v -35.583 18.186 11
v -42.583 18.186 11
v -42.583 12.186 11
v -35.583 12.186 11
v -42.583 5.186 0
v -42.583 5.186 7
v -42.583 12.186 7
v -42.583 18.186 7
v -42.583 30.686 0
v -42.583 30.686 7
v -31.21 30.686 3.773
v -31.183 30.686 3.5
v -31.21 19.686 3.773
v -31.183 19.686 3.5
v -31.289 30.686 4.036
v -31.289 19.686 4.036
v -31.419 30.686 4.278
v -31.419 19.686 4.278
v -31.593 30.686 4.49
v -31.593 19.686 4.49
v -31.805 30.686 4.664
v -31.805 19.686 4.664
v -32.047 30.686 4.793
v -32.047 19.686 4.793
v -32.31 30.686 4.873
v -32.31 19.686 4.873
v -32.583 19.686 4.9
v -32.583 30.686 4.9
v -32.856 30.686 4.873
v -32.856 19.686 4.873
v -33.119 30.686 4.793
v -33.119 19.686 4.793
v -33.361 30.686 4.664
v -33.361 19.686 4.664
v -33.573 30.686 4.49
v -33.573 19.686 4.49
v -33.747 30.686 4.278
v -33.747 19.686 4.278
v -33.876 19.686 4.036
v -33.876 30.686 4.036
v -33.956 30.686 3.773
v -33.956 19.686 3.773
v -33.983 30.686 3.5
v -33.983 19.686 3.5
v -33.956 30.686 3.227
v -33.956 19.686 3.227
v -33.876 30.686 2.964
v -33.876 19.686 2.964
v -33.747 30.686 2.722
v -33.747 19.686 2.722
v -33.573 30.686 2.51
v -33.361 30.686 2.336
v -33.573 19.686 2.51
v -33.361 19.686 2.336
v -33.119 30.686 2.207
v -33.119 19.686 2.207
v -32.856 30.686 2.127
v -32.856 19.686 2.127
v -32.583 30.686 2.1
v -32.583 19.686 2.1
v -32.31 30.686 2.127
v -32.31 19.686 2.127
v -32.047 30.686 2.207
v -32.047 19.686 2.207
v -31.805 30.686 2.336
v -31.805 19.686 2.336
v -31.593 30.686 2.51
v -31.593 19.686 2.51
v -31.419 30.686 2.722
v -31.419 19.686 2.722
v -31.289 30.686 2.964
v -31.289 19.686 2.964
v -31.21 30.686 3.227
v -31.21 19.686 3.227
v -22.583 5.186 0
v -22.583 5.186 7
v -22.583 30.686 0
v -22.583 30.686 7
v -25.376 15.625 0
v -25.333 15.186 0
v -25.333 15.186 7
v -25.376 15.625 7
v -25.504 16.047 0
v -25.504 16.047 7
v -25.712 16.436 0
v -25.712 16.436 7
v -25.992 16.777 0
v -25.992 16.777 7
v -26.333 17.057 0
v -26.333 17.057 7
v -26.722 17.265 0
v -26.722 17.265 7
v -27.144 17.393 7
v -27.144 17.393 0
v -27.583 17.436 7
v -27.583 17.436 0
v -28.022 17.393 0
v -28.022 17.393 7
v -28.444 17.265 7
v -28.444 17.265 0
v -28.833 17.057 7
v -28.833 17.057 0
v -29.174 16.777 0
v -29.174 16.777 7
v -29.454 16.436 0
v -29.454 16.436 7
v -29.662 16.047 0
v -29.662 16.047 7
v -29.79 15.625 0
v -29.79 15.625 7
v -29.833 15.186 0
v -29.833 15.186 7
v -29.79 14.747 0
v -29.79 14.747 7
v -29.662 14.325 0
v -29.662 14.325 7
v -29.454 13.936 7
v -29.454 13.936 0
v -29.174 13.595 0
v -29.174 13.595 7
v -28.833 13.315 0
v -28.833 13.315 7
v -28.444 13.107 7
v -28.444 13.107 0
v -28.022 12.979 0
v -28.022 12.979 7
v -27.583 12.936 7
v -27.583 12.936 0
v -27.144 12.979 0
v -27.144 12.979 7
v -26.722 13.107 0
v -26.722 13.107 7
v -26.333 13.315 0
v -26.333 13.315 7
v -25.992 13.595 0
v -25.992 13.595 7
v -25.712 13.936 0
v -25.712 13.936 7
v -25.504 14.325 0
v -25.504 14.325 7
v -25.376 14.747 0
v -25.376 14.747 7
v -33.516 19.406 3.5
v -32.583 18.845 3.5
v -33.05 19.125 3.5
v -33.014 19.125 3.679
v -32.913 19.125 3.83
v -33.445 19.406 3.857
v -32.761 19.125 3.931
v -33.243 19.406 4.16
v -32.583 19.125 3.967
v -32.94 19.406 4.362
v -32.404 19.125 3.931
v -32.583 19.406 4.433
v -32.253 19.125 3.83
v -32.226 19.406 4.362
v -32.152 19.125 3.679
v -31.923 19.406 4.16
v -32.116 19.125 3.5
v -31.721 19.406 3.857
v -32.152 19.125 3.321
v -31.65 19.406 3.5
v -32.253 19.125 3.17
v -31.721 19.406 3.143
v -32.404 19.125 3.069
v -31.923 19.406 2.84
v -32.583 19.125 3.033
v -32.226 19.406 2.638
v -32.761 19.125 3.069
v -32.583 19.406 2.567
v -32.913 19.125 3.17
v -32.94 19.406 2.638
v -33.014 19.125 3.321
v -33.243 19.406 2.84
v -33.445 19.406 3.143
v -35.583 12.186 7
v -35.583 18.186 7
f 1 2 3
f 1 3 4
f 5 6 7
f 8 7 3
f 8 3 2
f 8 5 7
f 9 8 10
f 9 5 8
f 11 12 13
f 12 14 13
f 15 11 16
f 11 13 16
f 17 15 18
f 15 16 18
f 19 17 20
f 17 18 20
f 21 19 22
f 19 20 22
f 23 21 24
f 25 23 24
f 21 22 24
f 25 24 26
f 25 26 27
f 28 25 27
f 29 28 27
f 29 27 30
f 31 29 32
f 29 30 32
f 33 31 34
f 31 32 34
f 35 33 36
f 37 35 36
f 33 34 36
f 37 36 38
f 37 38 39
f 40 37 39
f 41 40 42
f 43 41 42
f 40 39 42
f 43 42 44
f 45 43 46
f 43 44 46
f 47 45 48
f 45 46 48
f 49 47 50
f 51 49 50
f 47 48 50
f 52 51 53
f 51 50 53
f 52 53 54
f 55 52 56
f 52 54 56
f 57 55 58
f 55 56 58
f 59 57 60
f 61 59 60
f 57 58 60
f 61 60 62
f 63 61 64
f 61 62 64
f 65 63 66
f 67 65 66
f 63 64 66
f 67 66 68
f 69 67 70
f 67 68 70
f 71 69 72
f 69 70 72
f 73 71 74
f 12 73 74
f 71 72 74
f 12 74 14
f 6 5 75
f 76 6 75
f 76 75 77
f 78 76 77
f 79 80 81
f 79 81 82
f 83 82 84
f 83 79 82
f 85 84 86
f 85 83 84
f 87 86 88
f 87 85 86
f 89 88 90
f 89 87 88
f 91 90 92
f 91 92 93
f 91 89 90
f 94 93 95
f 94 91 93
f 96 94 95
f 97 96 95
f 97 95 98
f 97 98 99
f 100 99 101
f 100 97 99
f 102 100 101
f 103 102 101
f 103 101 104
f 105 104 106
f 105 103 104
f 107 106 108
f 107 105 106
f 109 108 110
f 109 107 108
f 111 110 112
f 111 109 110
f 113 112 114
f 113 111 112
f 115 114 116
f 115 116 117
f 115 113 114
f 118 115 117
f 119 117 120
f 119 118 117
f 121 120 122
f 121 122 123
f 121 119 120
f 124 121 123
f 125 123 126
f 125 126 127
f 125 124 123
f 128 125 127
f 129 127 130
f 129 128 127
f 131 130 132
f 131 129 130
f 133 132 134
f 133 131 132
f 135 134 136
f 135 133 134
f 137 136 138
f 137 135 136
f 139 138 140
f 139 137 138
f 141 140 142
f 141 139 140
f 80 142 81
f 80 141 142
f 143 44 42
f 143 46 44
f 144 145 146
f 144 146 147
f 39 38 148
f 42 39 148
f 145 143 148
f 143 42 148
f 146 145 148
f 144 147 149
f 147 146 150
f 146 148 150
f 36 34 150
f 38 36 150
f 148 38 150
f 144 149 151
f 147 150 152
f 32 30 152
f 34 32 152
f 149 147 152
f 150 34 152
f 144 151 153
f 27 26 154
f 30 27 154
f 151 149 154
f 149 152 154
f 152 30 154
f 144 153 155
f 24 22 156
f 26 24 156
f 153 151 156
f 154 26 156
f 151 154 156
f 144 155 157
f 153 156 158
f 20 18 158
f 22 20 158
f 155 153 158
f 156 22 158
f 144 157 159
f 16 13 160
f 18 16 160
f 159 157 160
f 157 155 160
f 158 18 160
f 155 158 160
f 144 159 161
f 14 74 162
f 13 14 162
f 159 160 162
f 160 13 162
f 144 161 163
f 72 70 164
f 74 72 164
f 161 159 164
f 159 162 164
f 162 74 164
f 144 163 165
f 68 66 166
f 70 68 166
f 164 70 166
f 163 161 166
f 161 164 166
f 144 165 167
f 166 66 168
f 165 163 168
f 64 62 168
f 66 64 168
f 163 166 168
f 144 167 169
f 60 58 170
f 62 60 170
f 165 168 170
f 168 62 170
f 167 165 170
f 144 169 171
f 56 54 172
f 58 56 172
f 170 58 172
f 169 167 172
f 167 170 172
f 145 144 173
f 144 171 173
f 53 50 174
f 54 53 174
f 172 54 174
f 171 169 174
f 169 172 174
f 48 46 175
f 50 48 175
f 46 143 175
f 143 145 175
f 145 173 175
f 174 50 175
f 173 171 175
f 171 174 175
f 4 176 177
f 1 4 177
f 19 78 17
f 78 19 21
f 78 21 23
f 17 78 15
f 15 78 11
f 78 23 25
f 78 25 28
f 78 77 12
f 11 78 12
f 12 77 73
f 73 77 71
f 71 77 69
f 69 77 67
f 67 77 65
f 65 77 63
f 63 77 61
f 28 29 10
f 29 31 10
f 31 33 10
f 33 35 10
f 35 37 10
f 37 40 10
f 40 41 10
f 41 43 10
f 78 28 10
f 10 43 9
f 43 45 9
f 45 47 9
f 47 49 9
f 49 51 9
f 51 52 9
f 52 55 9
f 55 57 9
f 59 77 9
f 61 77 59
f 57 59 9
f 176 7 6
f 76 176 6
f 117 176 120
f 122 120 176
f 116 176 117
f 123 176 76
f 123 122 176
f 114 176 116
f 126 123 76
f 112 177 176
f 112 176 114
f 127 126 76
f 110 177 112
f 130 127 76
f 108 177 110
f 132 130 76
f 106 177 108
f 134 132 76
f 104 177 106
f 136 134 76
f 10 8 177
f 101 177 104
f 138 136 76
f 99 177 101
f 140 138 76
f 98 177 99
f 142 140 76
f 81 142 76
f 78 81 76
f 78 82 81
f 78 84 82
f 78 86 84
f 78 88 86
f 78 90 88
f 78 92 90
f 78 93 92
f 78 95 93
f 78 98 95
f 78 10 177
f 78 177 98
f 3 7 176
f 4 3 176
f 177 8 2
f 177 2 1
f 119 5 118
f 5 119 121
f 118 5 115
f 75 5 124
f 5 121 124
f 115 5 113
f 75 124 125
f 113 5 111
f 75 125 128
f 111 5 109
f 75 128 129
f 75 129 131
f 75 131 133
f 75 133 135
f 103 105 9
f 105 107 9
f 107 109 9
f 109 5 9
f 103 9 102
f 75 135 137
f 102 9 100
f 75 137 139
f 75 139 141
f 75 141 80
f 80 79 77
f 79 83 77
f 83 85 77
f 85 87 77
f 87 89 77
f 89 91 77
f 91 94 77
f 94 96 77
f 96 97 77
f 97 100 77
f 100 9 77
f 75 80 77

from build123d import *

# Parameters (mm, degrees)
F0_R     = 2.25
F1_DEPTH = 7
F0_W     = 7
F0_H     = 6
F2_DEPTH = 11
F4_D     = 2.8
F4_DEPTH = 11
F4_TIP   = 0.8412048666


with BuildPart() as f1:
    # F0 (on Top) → F1 (new body)
    with BuildSketch(Plane.XY):
        Polygon((-22.5828918815, 30.6862212941), (-42.5828918815, 30.6862212941), (-42.5828918815, 18.1862212941), (-35.5828918815, 18.1862212941), (-35.5828918815, 12.1862212941), (-42.5828918815, 12.1862212941), (-42.5828918815, 5.1862212941), (-22.5828918815, 5.1862212941), align=None)
        with Locations((-27.5828918815, 15.1862212941)):
            Circle(F0_R, mode=Mode.SUBTRACT)
    extrude(amount=F1_DEPTH)

    # F0 (on Top) → F2 (join)
    with BuildSketch(Plane.XY):
        with Locations((-39.0828918815, 15.1862212941)):
            Rectangle(F0_W, F0_H)
    extrude(amount=F2_DEPTH)

    # F4
    with Locations(Plane(origin=(0, 30.6862212941, 0), x_dir=(-1, 0, 0), z_dir=(0, 1, 0))):
        with Locations((32.5828918815, 3.5)):
            Hole(F4_D / 2, depth=F4_DEPTH)
            with Locations((0, 0, -(F4_DEPTH + F4_TIP / 2))):  # 118° drill point
                Cone(0, F4_D / 2, F4_TIP, mode=Mode.SUBTRACT)


solid = f1.part
